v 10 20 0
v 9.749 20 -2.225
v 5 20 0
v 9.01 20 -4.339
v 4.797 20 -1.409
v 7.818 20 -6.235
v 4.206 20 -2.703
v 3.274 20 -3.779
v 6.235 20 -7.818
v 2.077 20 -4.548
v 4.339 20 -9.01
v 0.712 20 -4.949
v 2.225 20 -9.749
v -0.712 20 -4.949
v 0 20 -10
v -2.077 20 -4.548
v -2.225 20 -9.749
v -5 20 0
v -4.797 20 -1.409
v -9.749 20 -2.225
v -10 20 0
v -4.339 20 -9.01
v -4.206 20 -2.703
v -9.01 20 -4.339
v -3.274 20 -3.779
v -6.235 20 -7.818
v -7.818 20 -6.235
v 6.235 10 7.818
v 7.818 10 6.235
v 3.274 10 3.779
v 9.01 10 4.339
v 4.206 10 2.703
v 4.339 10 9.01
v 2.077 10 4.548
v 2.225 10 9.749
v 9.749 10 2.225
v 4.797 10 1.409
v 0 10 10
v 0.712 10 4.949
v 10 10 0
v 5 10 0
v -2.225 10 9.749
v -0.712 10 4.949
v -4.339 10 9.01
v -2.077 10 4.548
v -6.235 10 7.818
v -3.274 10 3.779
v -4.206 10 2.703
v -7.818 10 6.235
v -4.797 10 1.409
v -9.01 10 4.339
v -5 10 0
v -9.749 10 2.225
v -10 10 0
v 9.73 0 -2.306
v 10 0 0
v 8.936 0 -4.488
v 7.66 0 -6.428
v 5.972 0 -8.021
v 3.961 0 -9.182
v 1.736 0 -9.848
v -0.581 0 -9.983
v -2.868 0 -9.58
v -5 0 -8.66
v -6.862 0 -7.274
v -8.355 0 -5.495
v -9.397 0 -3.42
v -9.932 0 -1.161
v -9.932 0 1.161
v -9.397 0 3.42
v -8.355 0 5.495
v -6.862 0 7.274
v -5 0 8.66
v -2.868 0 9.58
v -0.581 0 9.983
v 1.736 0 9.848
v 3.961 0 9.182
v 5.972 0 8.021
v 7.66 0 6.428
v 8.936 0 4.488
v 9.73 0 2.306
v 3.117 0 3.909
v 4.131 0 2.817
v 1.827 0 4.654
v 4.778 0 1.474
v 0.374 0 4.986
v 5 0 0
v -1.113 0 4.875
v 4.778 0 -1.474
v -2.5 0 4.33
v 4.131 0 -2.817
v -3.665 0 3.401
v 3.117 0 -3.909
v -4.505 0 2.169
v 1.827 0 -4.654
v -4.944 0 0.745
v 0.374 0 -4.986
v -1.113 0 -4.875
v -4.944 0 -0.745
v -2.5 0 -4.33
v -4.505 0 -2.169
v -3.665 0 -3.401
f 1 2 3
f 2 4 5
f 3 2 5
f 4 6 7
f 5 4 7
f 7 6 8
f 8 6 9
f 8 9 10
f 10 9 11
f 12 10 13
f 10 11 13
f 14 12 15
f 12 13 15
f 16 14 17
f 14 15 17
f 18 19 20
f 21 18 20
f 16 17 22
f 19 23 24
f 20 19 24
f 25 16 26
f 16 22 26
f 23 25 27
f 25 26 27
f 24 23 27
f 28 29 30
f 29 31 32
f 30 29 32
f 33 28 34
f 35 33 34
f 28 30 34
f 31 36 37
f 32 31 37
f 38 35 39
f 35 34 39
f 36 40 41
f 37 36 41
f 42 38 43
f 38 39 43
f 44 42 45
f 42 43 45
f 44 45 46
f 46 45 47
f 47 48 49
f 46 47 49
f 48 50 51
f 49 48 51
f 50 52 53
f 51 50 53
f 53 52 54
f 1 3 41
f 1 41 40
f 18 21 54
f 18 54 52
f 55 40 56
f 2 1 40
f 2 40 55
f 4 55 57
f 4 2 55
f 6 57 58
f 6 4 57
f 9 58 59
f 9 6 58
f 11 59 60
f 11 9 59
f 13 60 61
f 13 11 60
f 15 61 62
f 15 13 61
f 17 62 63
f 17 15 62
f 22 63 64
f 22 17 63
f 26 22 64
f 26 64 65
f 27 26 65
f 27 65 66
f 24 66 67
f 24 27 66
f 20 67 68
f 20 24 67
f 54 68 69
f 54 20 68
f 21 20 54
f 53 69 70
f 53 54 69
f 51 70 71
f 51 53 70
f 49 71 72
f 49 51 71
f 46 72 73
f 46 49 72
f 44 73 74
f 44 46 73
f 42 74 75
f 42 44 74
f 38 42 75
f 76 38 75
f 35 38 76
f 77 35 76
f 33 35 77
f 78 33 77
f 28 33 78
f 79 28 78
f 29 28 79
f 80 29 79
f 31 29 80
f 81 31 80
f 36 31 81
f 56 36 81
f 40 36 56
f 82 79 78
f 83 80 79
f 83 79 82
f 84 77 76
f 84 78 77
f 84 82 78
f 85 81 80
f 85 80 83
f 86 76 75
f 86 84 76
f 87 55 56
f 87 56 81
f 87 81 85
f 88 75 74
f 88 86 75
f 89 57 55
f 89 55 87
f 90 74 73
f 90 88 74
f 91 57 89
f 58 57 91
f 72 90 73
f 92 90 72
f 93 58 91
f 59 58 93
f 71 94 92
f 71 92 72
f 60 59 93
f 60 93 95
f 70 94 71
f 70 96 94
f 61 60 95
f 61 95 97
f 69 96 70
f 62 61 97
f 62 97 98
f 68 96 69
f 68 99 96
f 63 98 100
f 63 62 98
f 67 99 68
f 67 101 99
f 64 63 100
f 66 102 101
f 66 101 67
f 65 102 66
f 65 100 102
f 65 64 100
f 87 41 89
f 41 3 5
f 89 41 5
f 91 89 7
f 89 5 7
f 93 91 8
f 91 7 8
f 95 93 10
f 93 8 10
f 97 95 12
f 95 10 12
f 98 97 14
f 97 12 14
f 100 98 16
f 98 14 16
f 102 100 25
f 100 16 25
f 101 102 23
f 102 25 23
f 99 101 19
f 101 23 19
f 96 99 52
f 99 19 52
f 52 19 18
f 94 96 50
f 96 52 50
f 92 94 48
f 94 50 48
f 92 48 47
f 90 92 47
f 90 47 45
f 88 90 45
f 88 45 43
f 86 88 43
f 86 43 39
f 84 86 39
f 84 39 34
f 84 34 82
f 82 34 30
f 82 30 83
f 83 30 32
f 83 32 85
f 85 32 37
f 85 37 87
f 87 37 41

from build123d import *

# Parameters (mm, degrees)
SKETCH1_W          = 10
SKETCH1_H          = 20
SKETCH2_R          = 5
CUT_EXTRUDE1_DEPTH = 20
CUT_EXTRUDE2_DEPTH = 10


with BuildPart() as part:
    # Sketch1 → Revolve1 (revolve)
    with BuildSketch(Plane.XY):
        with Locations((5, 10)):
            Rectangle(SKETCH1_W, SKETCH1_H)
    revolve(axis=Axis((0, 0, 0), (0, 1, 0)))

    # Sketch2 → Cut-Extrude1 (cut)
    with BuildSketch(Plane(origin=(0, 20, 0), x_dir=(1, 0, 0), z_dir=(0, 1, 0))):
        Circle(SKETCH2_R)
    extrude(amount=-CUT_EXTRUDE1_DEPTH, mode=Mode.SUBTRACT)

    # Sketch3 → Cut-Extrude2 (cut)
    with BuildSketch(Plane(origin=(0, 20, 0), x_dir=(1, 0, 0), z_dir=(0, 1, 0))):
        with BuildLine():
            Line((-10, 0), (-5, 0))
            ThreePointArc((-5, 0), (0, -5), (5, 0))
            Line((5, 0), (10, 0))
            ThreePointArc((10, 0), (0, -10), (-10, 0))
        make_face()
    extrude(amount=-CUT_EXTRUDE2_DEPTH, mode=Mode.SUBTRACT)


solid = part.part
